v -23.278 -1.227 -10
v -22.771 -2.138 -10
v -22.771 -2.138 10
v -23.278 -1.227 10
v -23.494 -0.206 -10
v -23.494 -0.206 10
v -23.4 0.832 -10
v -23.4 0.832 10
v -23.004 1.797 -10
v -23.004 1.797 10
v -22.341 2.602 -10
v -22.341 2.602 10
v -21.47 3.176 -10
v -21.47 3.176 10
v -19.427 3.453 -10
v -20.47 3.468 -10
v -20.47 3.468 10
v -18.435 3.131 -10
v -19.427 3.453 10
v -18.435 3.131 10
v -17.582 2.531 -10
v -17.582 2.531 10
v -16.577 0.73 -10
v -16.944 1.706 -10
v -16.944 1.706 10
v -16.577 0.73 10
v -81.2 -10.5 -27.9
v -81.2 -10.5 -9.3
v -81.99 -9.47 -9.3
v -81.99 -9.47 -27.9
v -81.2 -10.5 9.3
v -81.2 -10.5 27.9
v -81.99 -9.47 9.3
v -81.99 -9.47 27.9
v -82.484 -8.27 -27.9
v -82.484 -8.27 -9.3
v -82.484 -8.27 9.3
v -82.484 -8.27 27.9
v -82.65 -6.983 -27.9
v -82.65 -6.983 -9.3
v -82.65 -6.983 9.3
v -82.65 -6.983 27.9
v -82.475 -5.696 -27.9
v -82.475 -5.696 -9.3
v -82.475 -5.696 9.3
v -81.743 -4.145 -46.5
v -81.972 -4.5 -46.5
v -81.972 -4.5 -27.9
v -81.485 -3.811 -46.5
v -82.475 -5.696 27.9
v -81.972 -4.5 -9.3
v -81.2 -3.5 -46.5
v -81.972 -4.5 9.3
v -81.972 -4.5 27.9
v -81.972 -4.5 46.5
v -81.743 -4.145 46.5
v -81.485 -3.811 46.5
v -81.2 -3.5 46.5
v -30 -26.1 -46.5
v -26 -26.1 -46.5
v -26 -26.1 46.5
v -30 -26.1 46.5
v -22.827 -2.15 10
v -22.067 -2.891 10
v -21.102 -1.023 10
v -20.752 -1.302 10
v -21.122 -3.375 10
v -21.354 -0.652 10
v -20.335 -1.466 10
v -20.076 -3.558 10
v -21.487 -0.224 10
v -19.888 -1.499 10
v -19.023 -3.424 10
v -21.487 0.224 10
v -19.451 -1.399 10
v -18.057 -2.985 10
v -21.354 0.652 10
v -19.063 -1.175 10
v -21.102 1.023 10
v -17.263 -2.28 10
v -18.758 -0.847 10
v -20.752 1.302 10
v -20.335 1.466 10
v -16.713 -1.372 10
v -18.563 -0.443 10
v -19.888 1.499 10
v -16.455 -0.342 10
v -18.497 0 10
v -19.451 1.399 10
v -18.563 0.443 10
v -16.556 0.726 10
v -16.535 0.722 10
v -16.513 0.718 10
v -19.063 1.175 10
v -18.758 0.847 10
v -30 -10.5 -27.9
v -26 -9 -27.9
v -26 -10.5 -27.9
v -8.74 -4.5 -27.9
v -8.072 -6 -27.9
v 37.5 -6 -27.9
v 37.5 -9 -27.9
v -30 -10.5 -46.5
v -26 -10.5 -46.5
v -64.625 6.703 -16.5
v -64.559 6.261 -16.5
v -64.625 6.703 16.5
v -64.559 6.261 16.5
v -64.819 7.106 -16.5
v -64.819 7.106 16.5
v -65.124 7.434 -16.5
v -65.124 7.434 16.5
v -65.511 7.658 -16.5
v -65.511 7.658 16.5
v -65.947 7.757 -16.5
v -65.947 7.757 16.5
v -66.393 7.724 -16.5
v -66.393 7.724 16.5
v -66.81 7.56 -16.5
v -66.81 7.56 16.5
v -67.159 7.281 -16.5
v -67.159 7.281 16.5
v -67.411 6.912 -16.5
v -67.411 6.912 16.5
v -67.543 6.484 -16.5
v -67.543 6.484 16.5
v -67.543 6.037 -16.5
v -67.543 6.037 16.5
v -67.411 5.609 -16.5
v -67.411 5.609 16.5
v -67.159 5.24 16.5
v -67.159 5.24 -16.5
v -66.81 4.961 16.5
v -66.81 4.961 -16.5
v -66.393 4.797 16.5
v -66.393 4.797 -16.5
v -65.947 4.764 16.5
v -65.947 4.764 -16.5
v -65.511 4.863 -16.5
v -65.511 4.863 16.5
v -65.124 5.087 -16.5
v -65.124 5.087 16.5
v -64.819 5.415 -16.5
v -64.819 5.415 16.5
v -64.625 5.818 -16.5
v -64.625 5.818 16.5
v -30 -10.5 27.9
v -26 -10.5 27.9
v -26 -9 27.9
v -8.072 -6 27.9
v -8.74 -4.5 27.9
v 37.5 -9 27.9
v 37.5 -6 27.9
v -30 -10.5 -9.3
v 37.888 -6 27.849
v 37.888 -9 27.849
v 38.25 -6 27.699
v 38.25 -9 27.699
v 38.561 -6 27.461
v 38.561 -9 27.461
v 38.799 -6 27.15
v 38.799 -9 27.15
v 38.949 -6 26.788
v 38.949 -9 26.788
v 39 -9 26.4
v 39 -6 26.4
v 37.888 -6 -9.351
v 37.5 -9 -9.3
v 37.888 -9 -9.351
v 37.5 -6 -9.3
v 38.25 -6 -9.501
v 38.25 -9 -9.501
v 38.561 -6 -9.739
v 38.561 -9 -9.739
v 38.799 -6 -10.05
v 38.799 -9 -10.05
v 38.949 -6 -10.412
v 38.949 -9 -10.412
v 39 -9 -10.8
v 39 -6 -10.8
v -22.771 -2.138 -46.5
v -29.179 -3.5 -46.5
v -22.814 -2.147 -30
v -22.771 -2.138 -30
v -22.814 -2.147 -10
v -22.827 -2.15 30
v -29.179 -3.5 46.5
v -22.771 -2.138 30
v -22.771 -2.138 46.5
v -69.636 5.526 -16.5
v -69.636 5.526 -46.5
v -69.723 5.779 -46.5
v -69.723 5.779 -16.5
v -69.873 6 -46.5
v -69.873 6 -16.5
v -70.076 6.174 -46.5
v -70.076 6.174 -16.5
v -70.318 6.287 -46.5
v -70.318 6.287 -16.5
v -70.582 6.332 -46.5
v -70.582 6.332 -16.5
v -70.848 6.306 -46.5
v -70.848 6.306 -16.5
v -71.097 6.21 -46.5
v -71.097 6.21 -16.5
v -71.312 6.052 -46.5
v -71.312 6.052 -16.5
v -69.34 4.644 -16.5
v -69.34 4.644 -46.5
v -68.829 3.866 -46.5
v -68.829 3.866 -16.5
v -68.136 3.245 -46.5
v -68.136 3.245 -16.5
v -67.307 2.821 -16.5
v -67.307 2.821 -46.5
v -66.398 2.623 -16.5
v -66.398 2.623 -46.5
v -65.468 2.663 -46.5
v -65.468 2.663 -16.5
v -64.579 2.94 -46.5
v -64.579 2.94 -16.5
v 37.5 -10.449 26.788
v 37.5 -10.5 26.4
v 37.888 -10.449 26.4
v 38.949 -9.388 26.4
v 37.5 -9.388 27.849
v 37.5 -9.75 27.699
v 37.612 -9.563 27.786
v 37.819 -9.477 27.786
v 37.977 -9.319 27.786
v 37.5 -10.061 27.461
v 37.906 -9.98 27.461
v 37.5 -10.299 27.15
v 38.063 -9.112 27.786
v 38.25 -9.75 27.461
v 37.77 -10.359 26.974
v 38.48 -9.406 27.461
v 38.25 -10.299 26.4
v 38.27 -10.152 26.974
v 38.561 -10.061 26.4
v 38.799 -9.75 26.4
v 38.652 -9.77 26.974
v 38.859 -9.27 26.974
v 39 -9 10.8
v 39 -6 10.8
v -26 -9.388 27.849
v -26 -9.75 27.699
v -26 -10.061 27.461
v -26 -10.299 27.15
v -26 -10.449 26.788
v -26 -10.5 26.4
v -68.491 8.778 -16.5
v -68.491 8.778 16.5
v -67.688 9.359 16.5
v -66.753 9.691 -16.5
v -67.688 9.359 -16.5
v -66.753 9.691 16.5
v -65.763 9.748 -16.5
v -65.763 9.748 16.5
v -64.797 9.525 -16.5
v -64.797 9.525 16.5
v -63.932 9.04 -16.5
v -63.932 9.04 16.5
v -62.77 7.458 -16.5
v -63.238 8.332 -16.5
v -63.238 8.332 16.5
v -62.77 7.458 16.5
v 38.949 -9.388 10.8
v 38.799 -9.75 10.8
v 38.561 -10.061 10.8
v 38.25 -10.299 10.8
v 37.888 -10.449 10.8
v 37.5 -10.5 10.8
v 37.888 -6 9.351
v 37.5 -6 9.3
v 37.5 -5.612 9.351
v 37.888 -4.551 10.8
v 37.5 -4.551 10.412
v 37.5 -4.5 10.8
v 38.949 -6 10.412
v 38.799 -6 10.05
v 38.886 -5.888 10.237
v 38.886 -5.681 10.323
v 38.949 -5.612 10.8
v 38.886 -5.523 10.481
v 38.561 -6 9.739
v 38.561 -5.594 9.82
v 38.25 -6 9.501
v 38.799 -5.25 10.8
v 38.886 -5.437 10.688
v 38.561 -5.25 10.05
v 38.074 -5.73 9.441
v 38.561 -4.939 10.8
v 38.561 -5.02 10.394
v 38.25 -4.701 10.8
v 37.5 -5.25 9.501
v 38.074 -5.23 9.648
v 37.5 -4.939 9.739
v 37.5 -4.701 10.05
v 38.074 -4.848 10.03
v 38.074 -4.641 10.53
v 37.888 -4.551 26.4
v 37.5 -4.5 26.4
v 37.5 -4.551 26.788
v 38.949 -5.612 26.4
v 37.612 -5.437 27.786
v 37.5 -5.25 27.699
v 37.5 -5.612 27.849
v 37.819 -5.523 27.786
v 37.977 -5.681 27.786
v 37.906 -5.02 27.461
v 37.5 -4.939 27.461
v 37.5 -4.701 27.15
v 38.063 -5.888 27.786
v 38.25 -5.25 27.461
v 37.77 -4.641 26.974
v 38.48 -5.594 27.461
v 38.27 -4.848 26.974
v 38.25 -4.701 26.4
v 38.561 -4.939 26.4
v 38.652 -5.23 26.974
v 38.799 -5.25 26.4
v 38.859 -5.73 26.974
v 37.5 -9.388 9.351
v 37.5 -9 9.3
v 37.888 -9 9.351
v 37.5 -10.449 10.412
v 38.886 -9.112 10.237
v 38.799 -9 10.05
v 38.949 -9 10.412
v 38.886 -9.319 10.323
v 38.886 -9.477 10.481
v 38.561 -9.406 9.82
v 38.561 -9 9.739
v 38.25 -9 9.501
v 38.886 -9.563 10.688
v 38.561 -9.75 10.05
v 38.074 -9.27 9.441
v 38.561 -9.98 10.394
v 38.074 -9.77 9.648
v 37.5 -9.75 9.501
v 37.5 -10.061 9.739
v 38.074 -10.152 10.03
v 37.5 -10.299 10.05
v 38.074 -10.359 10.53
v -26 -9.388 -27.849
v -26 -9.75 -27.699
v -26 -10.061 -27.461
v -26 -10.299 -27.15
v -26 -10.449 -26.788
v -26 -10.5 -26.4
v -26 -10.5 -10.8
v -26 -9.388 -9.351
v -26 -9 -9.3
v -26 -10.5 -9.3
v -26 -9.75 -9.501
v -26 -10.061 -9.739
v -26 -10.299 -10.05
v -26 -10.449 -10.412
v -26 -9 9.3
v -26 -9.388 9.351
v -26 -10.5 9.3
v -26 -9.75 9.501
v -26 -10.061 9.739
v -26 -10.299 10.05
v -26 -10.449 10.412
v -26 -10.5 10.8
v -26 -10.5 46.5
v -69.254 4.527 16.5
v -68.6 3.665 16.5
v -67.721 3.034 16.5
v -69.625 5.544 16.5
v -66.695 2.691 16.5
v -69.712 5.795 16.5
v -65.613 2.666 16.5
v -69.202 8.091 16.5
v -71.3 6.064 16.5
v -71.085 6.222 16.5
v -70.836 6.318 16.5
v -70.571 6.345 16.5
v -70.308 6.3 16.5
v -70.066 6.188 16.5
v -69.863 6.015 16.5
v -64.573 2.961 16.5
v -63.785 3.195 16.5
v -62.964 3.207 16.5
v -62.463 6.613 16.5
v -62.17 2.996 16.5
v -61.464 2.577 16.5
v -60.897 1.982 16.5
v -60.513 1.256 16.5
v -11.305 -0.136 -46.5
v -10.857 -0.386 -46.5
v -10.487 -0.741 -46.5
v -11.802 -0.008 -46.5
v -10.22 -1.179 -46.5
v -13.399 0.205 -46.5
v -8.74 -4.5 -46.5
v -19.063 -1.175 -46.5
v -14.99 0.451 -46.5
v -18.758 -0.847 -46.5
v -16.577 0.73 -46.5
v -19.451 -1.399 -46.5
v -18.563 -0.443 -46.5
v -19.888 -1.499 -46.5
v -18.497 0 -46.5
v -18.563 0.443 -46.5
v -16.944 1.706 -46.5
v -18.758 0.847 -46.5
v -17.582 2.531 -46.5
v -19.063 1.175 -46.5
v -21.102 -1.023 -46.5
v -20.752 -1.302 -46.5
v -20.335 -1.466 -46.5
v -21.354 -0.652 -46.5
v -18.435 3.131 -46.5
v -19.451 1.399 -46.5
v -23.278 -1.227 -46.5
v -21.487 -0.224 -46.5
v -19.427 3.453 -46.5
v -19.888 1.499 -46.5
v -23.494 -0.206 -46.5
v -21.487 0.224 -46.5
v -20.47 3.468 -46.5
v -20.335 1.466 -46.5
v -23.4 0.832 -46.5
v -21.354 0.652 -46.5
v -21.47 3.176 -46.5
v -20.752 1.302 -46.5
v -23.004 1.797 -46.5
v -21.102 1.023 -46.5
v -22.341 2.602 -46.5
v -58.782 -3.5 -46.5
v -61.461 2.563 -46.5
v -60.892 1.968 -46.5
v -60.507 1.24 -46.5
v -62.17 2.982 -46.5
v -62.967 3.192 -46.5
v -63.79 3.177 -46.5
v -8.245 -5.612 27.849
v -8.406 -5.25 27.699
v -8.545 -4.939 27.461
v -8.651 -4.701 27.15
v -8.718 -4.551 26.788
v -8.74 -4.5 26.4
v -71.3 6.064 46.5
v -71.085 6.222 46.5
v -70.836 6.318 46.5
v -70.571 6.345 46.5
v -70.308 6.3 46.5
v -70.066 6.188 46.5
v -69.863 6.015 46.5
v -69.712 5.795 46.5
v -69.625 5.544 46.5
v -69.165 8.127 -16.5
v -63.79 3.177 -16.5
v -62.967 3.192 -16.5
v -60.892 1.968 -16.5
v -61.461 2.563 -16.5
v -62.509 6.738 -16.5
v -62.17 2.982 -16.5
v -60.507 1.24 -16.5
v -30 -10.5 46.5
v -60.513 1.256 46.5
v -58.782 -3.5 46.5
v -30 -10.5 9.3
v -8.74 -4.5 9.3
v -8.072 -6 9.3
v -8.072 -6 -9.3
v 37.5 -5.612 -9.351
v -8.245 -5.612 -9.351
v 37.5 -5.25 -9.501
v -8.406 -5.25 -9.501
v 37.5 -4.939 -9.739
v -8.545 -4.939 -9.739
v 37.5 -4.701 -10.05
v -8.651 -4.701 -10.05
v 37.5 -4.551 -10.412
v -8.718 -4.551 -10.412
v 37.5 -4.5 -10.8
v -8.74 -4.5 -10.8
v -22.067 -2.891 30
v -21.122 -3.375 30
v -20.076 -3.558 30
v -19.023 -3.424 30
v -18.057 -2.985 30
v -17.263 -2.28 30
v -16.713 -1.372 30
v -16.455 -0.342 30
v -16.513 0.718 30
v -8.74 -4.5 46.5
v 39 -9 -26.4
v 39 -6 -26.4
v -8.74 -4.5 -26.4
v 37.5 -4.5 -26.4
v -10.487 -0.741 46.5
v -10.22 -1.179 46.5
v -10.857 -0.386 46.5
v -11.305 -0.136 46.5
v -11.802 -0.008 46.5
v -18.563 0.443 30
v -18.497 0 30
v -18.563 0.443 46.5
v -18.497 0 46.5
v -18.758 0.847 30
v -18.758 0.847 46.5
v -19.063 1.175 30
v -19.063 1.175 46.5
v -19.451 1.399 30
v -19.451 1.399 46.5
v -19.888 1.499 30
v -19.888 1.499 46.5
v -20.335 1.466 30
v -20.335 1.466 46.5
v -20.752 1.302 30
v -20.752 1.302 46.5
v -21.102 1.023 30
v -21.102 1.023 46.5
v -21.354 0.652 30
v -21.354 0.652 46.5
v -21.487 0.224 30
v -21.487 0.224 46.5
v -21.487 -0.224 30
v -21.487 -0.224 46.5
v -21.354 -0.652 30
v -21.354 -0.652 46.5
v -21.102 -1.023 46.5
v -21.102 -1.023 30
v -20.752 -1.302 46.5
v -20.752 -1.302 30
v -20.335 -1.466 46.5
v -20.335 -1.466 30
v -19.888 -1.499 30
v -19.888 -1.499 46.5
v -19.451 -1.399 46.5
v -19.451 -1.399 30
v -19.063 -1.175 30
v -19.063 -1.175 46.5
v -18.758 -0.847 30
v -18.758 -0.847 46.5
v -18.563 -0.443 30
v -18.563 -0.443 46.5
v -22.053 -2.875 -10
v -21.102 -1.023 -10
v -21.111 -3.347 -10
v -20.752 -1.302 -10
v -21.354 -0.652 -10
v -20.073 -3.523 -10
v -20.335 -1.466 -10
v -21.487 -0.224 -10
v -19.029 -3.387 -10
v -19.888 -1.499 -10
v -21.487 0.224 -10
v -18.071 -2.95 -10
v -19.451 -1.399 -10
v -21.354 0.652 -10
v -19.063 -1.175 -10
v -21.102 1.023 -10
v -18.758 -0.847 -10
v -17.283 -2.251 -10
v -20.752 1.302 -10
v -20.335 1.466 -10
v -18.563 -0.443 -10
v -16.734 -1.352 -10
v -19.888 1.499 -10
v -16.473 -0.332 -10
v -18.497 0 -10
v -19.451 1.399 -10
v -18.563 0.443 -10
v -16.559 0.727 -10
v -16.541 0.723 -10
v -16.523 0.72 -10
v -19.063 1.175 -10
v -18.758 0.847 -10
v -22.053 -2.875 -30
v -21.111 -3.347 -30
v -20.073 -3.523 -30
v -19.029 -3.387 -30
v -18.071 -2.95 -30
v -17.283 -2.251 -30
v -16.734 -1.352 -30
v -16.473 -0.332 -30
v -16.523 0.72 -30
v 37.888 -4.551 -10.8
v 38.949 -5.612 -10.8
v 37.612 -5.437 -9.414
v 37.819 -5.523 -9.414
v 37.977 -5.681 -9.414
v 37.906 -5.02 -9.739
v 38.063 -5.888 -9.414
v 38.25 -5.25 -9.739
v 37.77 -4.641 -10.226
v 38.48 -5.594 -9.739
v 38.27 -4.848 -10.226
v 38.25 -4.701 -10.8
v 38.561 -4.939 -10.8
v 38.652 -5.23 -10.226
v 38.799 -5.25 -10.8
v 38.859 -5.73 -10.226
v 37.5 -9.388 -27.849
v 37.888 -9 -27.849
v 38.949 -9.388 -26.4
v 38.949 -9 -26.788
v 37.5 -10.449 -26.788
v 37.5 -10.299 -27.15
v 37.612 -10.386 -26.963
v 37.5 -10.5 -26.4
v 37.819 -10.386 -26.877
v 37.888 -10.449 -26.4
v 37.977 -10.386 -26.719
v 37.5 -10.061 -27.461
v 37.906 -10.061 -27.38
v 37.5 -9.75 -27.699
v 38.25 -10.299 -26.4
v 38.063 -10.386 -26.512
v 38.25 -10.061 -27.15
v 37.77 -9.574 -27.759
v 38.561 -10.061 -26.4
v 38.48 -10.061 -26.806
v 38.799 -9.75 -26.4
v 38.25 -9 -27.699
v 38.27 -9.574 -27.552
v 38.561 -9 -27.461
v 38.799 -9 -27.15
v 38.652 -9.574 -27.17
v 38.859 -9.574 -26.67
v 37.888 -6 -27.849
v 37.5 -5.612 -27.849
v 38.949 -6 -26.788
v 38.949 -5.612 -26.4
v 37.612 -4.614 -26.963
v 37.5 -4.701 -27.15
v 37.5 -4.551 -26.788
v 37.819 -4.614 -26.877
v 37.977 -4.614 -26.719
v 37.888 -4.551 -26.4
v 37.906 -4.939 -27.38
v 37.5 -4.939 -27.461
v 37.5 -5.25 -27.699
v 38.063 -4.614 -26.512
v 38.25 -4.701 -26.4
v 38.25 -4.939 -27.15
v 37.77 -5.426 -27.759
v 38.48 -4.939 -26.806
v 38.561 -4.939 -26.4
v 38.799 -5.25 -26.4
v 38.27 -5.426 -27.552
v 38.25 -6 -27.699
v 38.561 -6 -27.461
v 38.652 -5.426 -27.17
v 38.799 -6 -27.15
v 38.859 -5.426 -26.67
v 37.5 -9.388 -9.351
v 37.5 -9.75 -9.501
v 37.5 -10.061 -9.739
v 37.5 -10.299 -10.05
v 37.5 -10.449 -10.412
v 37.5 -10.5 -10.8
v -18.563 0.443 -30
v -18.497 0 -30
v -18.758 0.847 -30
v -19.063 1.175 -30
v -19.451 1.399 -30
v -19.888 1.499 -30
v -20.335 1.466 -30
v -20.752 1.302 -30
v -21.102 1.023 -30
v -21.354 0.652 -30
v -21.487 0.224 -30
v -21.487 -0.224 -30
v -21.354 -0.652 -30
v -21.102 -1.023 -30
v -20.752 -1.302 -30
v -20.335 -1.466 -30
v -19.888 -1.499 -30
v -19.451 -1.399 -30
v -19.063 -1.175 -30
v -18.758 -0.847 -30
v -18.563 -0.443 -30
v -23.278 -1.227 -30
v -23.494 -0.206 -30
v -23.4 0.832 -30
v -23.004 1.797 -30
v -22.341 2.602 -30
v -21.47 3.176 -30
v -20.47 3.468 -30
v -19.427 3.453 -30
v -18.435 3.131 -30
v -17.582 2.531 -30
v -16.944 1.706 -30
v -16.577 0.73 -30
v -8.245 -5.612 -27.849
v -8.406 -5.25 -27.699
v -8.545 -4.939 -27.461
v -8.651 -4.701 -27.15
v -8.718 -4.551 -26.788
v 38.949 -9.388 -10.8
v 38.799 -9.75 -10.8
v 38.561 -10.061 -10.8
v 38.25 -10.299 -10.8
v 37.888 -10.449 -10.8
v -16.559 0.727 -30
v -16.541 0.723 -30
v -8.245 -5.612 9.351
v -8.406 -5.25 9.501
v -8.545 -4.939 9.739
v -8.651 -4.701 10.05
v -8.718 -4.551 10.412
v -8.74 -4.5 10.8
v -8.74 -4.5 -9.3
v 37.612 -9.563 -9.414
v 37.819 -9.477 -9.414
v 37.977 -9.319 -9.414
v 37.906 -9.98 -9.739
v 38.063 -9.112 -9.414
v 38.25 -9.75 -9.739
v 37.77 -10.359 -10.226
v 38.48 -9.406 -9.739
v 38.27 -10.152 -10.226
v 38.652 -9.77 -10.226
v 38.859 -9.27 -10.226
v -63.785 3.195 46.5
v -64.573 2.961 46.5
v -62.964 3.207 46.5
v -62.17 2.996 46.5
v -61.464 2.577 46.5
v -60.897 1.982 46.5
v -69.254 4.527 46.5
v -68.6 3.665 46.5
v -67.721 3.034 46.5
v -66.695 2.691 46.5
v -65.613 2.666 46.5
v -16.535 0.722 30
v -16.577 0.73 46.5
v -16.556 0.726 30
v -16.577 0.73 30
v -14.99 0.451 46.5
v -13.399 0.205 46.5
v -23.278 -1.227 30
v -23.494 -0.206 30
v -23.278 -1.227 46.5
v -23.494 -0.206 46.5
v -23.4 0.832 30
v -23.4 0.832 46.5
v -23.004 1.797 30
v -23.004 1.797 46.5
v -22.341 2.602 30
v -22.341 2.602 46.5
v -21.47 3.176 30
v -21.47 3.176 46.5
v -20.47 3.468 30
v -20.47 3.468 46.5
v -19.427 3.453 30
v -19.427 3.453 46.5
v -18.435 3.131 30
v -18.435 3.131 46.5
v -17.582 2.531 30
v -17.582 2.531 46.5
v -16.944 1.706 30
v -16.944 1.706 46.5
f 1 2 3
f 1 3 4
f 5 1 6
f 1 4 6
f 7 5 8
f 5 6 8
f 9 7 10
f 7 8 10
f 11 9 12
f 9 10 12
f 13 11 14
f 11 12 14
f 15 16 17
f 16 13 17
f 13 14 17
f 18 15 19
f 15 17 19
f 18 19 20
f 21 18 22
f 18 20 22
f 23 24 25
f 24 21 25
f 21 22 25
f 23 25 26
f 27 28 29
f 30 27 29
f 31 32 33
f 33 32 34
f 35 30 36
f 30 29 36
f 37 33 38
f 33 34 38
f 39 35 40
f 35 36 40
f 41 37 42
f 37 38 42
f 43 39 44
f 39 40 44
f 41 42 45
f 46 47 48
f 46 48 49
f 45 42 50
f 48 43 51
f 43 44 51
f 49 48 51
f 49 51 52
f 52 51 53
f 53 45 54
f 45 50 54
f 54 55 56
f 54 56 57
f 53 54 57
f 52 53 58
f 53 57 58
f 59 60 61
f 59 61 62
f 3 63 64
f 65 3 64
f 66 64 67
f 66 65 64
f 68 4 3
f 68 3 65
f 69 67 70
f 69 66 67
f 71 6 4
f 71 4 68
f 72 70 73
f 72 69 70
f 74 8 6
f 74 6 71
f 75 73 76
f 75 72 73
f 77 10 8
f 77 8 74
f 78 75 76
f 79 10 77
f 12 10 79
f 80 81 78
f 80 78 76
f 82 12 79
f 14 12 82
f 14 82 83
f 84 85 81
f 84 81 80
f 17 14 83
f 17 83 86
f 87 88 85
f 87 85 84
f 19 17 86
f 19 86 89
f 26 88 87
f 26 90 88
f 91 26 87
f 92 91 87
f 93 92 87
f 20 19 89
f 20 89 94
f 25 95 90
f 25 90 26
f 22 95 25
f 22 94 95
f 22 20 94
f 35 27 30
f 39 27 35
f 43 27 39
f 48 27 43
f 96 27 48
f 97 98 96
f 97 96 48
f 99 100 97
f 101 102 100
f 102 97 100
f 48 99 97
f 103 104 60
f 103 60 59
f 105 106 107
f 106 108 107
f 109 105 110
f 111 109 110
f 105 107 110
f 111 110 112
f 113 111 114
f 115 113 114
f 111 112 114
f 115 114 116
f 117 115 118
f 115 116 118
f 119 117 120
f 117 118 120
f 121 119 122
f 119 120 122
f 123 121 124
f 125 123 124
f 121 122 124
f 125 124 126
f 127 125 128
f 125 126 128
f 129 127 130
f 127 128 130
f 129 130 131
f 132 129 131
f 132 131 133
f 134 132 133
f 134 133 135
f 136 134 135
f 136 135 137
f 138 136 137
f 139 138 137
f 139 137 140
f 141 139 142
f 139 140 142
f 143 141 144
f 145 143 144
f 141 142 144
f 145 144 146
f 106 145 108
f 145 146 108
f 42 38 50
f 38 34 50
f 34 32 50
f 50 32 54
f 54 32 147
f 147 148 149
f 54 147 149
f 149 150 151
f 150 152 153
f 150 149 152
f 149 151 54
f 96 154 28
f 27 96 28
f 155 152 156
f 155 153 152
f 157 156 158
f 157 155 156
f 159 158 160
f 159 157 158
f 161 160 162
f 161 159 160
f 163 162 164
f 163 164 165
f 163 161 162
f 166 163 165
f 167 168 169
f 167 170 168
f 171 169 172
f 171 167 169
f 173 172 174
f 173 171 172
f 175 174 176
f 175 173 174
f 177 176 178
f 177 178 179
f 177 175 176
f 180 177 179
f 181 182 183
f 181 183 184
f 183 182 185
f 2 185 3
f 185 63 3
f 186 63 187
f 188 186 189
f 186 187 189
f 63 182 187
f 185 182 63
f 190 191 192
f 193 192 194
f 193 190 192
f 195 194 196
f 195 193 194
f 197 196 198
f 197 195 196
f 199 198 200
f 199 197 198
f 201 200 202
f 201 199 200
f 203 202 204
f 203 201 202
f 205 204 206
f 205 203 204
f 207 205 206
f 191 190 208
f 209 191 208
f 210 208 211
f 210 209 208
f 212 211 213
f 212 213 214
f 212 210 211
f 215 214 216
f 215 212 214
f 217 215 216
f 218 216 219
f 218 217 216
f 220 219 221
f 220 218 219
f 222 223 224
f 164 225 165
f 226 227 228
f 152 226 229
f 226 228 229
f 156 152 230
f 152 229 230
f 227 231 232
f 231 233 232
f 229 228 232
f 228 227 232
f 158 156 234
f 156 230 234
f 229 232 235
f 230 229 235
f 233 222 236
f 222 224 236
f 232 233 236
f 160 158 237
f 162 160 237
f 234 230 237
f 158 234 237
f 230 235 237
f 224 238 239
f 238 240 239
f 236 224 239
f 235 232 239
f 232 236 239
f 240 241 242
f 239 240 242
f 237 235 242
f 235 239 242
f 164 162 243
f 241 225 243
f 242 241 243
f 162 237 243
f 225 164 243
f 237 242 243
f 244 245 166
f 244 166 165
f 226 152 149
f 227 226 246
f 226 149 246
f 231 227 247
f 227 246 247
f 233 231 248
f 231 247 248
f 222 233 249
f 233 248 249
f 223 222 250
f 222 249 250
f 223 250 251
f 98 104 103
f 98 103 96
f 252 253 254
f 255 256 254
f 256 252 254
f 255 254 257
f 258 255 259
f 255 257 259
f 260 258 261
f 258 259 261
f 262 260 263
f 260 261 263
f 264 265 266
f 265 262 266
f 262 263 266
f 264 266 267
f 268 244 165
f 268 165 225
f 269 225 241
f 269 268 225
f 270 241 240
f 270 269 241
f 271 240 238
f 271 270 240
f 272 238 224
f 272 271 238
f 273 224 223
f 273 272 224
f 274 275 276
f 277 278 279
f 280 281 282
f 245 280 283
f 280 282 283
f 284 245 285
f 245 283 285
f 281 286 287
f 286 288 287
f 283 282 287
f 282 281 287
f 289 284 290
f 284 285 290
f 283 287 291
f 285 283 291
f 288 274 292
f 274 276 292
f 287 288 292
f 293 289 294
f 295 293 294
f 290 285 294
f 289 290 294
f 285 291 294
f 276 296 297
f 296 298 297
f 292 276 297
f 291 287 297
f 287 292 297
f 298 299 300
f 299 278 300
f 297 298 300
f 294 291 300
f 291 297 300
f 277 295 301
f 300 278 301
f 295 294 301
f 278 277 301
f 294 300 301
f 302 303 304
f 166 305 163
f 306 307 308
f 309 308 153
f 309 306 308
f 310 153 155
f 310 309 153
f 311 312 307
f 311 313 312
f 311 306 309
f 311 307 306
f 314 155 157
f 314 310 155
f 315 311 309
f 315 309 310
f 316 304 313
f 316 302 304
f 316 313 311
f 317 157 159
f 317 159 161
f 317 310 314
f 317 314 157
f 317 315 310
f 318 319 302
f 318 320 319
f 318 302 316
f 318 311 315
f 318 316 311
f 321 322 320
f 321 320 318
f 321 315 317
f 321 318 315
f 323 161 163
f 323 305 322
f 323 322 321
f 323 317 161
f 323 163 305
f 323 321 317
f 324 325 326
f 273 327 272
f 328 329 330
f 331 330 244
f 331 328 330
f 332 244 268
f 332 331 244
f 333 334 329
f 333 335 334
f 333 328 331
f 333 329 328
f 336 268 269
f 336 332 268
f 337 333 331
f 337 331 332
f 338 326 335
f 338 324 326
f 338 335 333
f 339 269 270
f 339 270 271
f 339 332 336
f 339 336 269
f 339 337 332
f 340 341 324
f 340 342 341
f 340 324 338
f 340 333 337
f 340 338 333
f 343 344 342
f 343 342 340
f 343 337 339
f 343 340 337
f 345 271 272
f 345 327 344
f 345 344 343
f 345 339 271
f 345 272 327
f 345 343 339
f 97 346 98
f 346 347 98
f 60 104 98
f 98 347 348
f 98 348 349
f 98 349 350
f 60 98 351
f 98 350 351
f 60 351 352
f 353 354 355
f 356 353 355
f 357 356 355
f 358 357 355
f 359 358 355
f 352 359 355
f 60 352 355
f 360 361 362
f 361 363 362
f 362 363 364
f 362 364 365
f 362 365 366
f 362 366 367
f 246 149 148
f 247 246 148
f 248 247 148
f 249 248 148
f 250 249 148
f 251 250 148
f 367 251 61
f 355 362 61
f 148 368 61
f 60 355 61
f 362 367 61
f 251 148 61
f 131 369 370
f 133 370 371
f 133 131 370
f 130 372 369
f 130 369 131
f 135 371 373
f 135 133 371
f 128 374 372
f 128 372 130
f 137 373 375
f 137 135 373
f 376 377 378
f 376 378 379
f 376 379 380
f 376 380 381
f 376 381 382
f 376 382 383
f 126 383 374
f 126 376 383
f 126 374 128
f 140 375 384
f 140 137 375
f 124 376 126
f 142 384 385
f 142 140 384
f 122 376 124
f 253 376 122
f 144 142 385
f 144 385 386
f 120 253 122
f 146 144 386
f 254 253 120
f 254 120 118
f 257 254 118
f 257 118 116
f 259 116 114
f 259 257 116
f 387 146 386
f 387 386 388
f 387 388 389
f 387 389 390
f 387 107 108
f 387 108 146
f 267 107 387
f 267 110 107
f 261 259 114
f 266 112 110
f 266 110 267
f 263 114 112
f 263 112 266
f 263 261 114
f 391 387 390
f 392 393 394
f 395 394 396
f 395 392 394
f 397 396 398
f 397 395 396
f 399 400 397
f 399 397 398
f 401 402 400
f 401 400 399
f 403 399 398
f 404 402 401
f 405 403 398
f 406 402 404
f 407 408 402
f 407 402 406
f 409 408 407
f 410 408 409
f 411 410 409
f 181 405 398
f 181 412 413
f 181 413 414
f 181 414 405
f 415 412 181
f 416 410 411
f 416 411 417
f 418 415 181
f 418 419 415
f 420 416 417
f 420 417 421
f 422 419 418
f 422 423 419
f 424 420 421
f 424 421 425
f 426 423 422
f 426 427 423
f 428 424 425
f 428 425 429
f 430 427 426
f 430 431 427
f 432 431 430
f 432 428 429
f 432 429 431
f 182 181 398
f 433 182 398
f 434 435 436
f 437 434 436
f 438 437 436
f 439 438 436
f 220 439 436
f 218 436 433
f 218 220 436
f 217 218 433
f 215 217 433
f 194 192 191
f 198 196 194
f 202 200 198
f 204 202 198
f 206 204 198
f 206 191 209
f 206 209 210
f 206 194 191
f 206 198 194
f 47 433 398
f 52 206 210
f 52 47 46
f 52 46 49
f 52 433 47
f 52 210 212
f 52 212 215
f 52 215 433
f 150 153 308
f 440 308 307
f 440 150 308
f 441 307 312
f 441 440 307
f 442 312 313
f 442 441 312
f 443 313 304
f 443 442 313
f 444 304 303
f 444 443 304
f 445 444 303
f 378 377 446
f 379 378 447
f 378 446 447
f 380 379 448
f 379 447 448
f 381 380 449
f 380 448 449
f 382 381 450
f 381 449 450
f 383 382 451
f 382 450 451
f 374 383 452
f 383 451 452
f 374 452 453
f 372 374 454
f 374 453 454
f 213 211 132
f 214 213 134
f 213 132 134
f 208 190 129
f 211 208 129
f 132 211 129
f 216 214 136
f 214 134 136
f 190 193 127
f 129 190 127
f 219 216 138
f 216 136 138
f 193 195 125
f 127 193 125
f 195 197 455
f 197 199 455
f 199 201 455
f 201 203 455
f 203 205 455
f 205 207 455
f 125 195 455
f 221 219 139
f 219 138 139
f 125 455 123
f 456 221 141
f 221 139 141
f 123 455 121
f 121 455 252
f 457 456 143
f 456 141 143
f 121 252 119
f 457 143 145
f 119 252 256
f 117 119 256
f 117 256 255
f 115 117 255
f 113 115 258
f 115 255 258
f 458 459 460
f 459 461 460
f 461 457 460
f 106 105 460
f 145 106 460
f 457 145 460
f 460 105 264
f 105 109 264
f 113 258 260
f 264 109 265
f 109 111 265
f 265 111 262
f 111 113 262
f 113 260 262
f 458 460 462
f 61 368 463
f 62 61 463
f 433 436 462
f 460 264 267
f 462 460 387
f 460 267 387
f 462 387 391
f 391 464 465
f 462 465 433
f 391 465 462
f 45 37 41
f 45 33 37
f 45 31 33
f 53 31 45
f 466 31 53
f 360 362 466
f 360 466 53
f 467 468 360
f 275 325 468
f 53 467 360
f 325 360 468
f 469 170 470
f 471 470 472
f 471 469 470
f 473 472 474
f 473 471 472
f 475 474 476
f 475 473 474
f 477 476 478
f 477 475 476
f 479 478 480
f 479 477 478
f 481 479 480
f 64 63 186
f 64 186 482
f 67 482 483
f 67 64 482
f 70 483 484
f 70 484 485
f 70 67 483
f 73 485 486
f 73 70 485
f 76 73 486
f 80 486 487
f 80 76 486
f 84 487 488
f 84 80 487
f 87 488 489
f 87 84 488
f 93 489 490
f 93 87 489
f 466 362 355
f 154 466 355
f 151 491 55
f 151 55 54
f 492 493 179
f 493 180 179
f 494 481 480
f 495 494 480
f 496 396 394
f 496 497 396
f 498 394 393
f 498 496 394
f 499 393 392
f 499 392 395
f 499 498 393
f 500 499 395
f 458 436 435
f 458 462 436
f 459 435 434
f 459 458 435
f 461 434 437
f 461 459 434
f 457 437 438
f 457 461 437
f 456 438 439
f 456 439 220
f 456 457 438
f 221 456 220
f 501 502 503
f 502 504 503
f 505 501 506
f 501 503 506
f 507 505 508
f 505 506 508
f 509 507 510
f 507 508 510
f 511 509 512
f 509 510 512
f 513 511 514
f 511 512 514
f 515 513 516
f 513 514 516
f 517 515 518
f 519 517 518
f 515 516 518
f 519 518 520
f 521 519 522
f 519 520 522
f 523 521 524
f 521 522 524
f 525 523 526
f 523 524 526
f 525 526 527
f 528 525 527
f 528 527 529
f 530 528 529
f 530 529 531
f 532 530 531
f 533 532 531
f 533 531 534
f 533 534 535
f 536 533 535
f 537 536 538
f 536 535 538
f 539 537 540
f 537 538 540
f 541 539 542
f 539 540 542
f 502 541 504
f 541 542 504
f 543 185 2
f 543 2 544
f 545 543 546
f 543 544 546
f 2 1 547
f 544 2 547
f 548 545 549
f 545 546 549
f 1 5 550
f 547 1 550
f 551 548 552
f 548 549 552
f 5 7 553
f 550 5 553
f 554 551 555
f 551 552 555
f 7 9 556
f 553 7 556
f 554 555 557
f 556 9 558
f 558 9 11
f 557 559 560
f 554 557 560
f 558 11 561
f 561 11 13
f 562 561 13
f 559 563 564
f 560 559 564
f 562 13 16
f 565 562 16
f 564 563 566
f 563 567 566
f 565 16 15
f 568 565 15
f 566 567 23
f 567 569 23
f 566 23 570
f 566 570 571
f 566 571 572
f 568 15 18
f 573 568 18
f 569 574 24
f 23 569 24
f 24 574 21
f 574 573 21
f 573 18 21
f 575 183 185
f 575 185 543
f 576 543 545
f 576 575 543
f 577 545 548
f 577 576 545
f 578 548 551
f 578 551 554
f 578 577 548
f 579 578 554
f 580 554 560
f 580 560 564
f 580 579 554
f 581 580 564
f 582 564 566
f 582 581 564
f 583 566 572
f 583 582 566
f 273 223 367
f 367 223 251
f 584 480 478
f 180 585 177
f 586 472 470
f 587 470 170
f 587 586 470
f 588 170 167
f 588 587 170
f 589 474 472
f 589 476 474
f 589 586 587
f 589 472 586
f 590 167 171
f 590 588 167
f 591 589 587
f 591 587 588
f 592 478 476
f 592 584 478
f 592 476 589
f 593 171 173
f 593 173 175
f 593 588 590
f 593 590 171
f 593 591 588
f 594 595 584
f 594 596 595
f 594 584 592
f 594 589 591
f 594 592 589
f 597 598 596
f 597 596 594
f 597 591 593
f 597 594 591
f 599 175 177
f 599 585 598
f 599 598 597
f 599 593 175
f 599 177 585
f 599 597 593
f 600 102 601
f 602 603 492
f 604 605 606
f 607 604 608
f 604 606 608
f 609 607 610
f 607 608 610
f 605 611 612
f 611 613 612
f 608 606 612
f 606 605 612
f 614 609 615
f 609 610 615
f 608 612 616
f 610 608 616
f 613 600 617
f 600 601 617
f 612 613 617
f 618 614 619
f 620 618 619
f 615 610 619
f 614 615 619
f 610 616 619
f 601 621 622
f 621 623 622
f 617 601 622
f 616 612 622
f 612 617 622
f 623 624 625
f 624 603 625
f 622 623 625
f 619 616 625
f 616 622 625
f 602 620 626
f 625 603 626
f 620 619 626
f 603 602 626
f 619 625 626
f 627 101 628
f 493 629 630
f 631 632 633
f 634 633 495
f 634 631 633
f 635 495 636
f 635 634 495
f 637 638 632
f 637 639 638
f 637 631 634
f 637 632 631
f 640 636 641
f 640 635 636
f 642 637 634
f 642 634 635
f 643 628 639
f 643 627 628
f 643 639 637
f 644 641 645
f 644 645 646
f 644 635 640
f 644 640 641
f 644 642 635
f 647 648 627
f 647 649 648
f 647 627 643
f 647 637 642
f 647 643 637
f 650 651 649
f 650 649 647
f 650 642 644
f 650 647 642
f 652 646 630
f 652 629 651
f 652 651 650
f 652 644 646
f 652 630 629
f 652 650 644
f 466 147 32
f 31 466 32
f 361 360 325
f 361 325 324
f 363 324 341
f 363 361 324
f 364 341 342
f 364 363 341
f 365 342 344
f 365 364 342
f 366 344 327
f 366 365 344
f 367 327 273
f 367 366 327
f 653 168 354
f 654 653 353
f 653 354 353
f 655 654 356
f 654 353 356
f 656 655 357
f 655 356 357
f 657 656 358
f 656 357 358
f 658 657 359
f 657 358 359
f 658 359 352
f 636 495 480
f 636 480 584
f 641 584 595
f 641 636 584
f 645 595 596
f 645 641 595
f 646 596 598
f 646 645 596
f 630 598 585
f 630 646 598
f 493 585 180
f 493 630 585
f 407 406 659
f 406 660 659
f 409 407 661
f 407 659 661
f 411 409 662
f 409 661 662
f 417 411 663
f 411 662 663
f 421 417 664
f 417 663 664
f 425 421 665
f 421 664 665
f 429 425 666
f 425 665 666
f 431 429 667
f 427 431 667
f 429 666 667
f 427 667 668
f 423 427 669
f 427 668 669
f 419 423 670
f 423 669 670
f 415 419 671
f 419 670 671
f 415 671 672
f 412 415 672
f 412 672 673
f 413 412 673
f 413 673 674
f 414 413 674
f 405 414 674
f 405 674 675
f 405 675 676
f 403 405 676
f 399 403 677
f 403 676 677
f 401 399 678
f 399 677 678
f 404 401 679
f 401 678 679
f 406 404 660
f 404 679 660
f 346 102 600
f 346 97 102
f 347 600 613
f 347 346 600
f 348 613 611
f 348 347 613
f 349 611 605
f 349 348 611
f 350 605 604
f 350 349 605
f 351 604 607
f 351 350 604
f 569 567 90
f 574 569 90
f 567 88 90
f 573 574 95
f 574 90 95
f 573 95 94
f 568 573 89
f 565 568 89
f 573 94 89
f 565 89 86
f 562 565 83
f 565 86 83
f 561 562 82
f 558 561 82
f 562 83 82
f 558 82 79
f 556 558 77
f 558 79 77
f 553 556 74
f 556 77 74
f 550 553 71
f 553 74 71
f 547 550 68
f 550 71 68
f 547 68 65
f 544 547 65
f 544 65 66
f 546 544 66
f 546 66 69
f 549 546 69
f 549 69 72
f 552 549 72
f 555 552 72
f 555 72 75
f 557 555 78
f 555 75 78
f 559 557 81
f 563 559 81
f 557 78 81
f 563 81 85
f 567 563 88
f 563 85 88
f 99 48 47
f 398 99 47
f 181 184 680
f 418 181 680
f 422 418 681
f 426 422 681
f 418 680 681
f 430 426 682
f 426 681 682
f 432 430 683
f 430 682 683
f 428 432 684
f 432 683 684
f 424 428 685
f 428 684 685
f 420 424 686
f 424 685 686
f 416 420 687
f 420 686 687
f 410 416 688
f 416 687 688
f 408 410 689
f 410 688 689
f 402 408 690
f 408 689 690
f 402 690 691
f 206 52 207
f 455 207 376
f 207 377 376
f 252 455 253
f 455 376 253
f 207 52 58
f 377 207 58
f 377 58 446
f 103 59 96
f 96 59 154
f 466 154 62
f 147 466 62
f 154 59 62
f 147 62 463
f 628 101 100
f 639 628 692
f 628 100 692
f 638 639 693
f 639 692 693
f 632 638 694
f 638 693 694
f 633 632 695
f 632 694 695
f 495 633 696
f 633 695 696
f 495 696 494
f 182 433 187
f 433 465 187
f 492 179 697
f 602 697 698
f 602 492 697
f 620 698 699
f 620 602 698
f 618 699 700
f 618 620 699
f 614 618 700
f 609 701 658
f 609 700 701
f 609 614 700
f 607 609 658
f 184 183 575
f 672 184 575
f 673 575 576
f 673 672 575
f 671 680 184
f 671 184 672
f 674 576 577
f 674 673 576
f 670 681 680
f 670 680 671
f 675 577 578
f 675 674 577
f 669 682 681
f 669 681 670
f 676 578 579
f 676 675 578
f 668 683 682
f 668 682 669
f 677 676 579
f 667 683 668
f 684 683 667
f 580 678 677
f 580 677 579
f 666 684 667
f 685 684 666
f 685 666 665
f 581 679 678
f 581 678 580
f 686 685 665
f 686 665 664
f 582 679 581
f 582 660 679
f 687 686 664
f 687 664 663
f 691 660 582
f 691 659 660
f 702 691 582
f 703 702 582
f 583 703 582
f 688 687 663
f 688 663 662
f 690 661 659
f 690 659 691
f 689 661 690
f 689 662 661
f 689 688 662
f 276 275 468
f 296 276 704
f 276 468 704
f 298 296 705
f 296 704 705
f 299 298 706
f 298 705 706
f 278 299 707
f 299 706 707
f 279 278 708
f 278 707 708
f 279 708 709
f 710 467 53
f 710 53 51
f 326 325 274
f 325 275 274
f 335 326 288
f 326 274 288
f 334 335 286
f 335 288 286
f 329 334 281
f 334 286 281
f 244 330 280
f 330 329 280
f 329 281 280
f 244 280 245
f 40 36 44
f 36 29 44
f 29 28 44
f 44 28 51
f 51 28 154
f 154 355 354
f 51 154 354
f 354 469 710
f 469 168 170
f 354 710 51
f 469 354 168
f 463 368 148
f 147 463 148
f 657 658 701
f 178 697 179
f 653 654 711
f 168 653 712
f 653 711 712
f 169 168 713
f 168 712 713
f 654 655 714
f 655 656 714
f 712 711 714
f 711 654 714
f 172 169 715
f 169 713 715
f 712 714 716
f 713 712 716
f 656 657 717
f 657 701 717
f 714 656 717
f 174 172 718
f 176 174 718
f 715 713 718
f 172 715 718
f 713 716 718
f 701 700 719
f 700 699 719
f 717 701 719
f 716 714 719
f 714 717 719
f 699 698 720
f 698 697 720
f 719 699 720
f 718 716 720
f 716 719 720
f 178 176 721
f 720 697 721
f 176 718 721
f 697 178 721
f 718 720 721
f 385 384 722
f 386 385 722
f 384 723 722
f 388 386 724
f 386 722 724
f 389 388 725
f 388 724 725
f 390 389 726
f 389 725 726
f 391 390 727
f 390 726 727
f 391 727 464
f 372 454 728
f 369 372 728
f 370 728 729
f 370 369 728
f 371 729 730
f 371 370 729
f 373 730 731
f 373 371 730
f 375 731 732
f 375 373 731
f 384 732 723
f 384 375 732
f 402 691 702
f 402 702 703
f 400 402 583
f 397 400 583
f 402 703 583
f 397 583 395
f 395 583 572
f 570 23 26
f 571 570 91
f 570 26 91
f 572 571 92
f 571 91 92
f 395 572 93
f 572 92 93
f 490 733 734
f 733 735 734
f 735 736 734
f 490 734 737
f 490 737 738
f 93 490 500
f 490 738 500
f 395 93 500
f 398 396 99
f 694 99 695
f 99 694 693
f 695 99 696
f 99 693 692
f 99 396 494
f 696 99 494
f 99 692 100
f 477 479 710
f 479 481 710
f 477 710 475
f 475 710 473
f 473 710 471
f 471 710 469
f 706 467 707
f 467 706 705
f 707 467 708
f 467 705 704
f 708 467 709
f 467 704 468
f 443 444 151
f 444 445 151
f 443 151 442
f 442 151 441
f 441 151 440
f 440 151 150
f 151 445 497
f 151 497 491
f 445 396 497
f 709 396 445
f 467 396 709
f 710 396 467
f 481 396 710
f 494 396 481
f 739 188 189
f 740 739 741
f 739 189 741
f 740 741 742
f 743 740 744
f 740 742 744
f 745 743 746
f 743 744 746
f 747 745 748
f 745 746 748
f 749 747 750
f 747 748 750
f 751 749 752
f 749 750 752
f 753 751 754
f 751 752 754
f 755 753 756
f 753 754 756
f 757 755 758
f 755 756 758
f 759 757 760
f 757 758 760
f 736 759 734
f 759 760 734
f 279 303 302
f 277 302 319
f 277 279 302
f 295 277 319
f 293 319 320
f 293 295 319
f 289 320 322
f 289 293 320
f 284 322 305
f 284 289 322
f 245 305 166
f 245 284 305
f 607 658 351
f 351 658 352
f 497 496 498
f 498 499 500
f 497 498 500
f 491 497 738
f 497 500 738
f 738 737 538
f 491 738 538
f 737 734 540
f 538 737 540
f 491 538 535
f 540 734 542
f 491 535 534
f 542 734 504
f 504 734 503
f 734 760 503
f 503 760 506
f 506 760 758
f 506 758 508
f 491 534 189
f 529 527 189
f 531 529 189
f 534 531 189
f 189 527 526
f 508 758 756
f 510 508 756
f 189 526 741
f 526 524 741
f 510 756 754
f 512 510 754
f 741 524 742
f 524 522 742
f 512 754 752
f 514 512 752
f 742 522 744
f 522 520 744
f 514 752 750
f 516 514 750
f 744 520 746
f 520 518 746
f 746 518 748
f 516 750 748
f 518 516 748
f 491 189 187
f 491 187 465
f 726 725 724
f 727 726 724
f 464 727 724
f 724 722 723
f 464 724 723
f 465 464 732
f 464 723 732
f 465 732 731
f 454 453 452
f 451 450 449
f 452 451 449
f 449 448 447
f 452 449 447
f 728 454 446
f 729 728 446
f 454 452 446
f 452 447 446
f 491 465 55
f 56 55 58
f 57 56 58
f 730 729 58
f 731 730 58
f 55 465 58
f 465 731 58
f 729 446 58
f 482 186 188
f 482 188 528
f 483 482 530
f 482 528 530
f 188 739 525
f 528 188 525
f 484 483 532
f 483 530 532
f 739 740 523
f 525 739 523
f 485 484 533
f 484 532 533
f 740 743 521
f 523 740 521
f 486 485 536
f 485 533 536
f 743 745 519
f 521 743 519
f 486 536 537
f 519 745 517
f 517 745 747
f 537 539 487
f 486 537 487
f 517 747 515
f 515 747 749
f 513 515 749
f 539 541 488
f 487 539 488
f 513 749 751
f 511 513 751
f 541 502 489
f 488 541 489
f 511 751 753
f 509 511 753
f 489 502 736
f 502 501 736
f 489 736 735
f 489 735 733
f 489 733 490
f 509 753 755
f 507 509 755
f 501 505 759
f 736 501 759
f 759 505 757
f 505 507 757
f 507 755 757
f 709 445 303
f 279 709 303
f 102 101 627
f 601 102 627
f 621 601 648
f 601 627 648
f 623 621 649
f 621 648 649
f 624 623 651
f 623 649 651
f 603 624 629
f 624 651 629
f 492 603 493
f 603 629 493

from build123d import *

# Parameters (mm, degrees)
SALIENTE_EXTRUIR2_DEPTH   = 46.49999999999997
CROQUIS3_R                = 1.5007742960379549
CROQUIS3_R_2              = 1.503322104684281
CORTAR_EXTRUIR1_DEPTH     = 46.49999999999997
CORTAR_EXTRUIR2_START     = 16.5
CORTAR_EXTRUIR2_OUTLINE_R = 1.500774296
CORTAR_EXTRUIR2_DEPTH     = 30
REDONDEO2_R               = 3
CORTAR_EXTRUIR3_START     = -46.5
CORTAR_EXTRUIR3_OUTLINE_R = 1.500774296
CORTAR_EXTRUIR3_DEPTH     = 30
REDONDEO3_R               = 3
CORTAR_EXTRUIR4_START     = 10
CORTAR_EXTRUIR4_OUTLINE_R = 1.503322105
CORTAR_EXTRUIR4_DEPTH     = 20
CORTAR_EXTRUIR5_START     = -30
CORTAR_EXTRUIR5_OUTLINE_R = 1.503322105
CORTAR_EXTRUIR5_DEPTH     = 20
REDONDEO4_R               = 1
CORTAR_EXTRUIR12_DEPTH    = 155.46083657878992
CROQUIS6_W                = 18.599999999999966
CROQUIS6_H                = 6.000000000000004
CORTAR_EXTRUIR13_DEPTH    = 133.823646460648
CROQUIS7_W                = 18.599999999999966
CROQUIS7_H                = 6.000000000000004
CORTAR_EXTRUIR14_DEPTH    = 133.823646460648
REDONDEO5_R               = 1.5
REDONDEO6_R               = 2


# Read off the part's stored shape, not the designer's step: Cortar-Extruir2, Cortar-Extruir3, Cortar-Extruir4, Cortar-Extruir5
with BuildPart() as part:
    # Croquis1 → Saliente-Extruir2 (new, symmetric)
    with BuildSketch(Plane.XY):
        with BuildLine():
            Line((-10.683677010448408, -0.13792021644576552), (-8.74048031278475, -4.500000000012256))
            Line((-8.74048031278475, -4.500000000012256), (39.00000000000001, -4.500000000012256))
            Line((39.00000000000001, -4.500000000012256), (39.00000000000001, -10.500000000012262))
            Line((39.00000000000001, -10.500000000012262), (-25.99999999999999, -10.500000000012262))
            Line((-25.99999999999999, -10.500000000012262), (-25.99999999999999, -26.10000000001226))
            Line((-25.99999999999999, -26.10000000001226), (-29.999999999999986, -26.100000000012262))
            Line((-29.999999999999986, -26.100000000012262), (-29.999999999999993, -10.500000000012264))
            Line((-29.999999999999993, -10.500000000012264), (-81.19999999999999, -10.500000000012271))
            ThreePointArc((-81.19999999999999, -10.500000000012271), (-82.6497474683058, -7.000000000012269), (-81.19999999999999, -3.5000000000122697))
            Line((-81.19999999999999, -3.5000000000122697), (-68.49110633124283, 8.777732226211745))
            ThreePointArc((-68.49110633124283, 8.777732226211745), (-65.27231144406849, 9.67090124633749), (-62.77037609438549, 7.457598074555828))
            Line((-62.77037609438549, 7.457598074555828), (-58.782136556190004, -3.5000000000122684))
            Line((-58.782136556190004, -3.5000000000122684), (-29.179236040573016, -3.500000000012267))
            Line((-29.179236040573016, -3.500000000012267), (-22.77115447929422, -2.1379202164457745))
            ThreePointArc((-22.77115447929422, -2.1379202164457745), (-21.470497358111732, 3.17610414183578), (-16.57695737694327, 0.729917256089285))
            ThreePointArc((-16.57695737694327, 0.729917256089285), (-13.63855195060632, 0.24007822050397465), (-10.683677010448408, -0.13792021644576552))
        make_face()
    extrude(amount=SALIENTE_EXTRUIR2_DEPTH, both=True)

    # Croquis3 → Cortar-Extruir1 (cut, symmetric)
    with BuildSketch(Plane.XY):
        with Locations((-66.05930026713617, 6.260527572915973)):
            Circle(CROQUIS3_R)
        with Locations((-19.999999999999996, 0)):
            Circle(CROQUIS3_R_2)
    extrude(amount=CORTAR_EXTRUIR1_DEPTH, both=True, mode=Mode.SUBTRACT)

    # Cortar-Extruir2 outline → Cortar-Extruir2 (cut)
    with BuildSketch(Plane.XY.offset(CORTAR_EXTRUIR2_START)):
        with BuildLine():
            Line((-68.491106331, 8.777732226), (-69.201699105, 8.091246996))
            ThreePointArc((-69.201699105, 8.091246996), (-66.848168988, 2.721235528), (-62.462991688, 6.61306636))
            Line((-62.462991688, 6.61306636), (-62.770376094, 7.457598075))
            ThreePointArc((-62.770376094, 7.457598075), (-65.272311444, 9.670901246), (-68.491106331, 8.777732226))
        make_face()
        with Locations((-66.059300267, 6.260527573)):
            Circle(CORTAR_EXTRUIR2_OUTLINE_R, mode=Mode.SUBTRACT)
    extrude(amount=CORTAR_EXTRUIR2_DEPTH, mode=Mode.SUBTRACT)

    # Redondeo2
    redondeo2_edges = [part.edges().sort_by_distance(p)[0] for p in [
        (-62.462991687999995, 6.613066360000001, 31.5),
    ]]
    fillet(redondeo2_edges, radius=REDONDEO2_R)

    # Cortar-Extruir3 outline → Cortar-Extruir3 (cut)
    with BuildSketch(Plane.XY.offset(CORTAR_EXTRUIR3_START)):
        with BuildLine():
            ThreePointArc((-69.164573514, 8.127113066), (-66.827048097, 2.685630168), (-62.508602445, 6.738380883))
            Line((-62.508602445, 6.738380883), (-62.770376094, 7.457598075))
            ThreePointArc((-62.770376094, 7.457598075), (-65.272311444, 9.670901246), (-68.491106331, 8.777732226))
            Line((-68.491106331, 8.777732226), (-69.164573514, 8.127113066))
        make_face()
        with Locations((-66.059300267, 6.260527573)):
            Circle(CORTAR_EXTRUIR3_OUTLINE_R, mode=Mode.SUBTRACT)
    extrude(amount=CORTAR_EXTRUIR3_DEPTH, mode=Mode.SUBTRACT)

    # Redondeo3
    redondeo3_edges = [part.edges().sort_by_distance(p)[0] for p in [
        (-62.508602444999994, 6.738380883, -31.5),
    ]]
    fillet(redondeo3_edges, radius=REDONDEO3_R)

    # Cortar-Extruir4 outline → Cortar-Extruir4 (cut)
    with BuildSketch(Plane.XY.offset(CORTAR_EXTRUIR4_START)):
        with BuildLine():
            Line((-22.771154479, -2.137920216), (-22.827271519, -2.149848262))
            ThreePointArc((-22.827271519, -2.149848262), (-18.523452571, -3.240720775), (-16.513304708, 0.718087877))
            ThreePointArc((-16.513304708, 0.718087877), (-16.545132262, 0.723996005), (-16.576957377, 0.729917256))
            ThreePointArc((-16.576957377, 0.729917256), (-21.470497358, 3.176104142), (-22.771154479, -2.137920216))
        make_face()
        with Locations((-20, 0)):
            Circle(CORTAR_EXTRUIR4_OUTLINE_R, mode=Mode.SUBTRACT)
    extrude(amount=CORTAR_EXTRUIR4_DEPTH, mode=Mode.SUBTRACT)

    # Cortar-Extruir5 outline → Cortar-Extruir5 (cut)
    with BuildSketch(Plane.XY.offset(CORTAR_EXTRUIR5_START)):
        with BuildLine():
            ThreePointArc((-22.813751372, -2.146974465), (-18.533466696, -3.203987987), (-16.523253553, 0.719933216))
            ThreePointArc((-16.523253553, 0.719933216), (-16.550106333, 0.724920565), (-16.576957377, 0.729917256))
            ThreePointArc((-16.576957377, 0.729917256), (-21.470497358, 3.176104142), (-22.771154479, -2.137920216))
            Line((-22.771154479, -2.137920216), (-22.813751372, -2.146974465))
        make_face()
        with Locations((-20, 0)):
            Circle(CORTAR_EXTRUIR5_OUTLINE_R, mode=Mode.SUBTRACT)
    extrude(amount=CORTAR_EXTRUIR5_DEPTH, mode=Mode.SUBTRACT)

    # Redondeo4
    redondeo4_edges = [part.edges().sort_by_distance(p)[0] for p in [
        (-69.20169910499999, 8.091246995999999, 31.5),
        (-69.164573514, 8.127113066, -31.5),
    ]]
    fillet(redondeo4_edges, radius=REDONDEO4_R)

    # Croquis3D6 → Cortar-Extruir12 (cut, through all)
    with BuildSketch(Plane(origin=(39.00000000000001, -10.500000000012262, -46.49999999999997), x_dir=(0, 0.30700277992275854, 0.9517086177605509), z_dir=(-1, 0, 0))):
        Polygon((0, 0), (17.701780290346246, -5.710251706563308), (19.543796969882806, 8.7e-16), (1.8420166795365527, 5.71025170656331), align=None)
    extrude(amount=CORTAR_EXTRUIR12_DEPTH, mode=Mode.SUBTRACT)

    # Croquis6 → Cortar-Extruir13 (cut, through all)
    with BuildSketch(Plane(origin=(39.00000000000001, 0, 0), x_dir=(0, 0, -1), z_dir=(1, 0, 0))):
        with Locations((-1.865e-14, -7.50000000001226)):
            Rectangle(CROQUIS6_W, CROQUIS6_H)
    extrude(amount=-CORTAR_EXTRUIR13_DEPTH, mode=Mode.SUBTRACT)

    # Croquis7 → Cortar-Extruir14 (cut, through all)
    with BuildSketch(Plane(origin=(39.00000000000001, 0, 0), x_dir=(0, 0, -1), z_dir=(1, 0, 0))):
        with Locations((-37.19999999999999, -7.50000000001226)):
            Rectangle(CROQUIS7_W, CROQUIS7_H)
    extrude(amount=-CORTAR_EXTRUIR14_DEPTH, mode=Mode.SUBTRACT)

    # Redondeo5
    redondeo5_edges = [part.edges().sort_by_distance(p)[0] for p in [
        (39.00000000000001, -7.500000000012258, -27.899999999999963),
        (15.12975984360763, -4.500000000012255, -27.899999999999963),
        (6.500000000000007, -10.50000000001226, -27.89999999999997),
        (39.00000000000001, -4.500000000012256, -18.599999999999966),
        (39.00000000000001, -10.500000000012262, -18.599999999999966),
        (6.500000000000007, -10.500000000012262, -9.299999999999965),
        (15.12975984360763, -4.500000000012258, -9.299999999999965),
        (6.500000000000007, -10.500000000012262, 9.300000000000002),
        (15.12975984360763, -4.500000000012258, 9.300000000000002),
        (39.00000000000001, -7.50000000001226, -9.299999999999965),
        (39.00000000000001, -7.50000000001226, 9.300000000000002),
        (39.00000000000001, -4.500000000012256, 18.600000000000005),
        (39.00000000000001, -10.500000000012262, 18.600000000000005),
        (15.12975984360763, -4.500000000012258, 27.900000000000006),
        (6.500000000000007, -10.500000000012262, 27.900000000000006),
        (39.00000000000001, -7.50000000001226, 27.900000000000006),
    ]]
    fillet(redondeo5_edges, radius=REDONDEO5_R)

    # Redondeo6
    redondeo6_edges = [part.edges().sort_by_distance(p)[0] for p in [
        (-10.683677010448406, -0.13792021644577176, 0),
    ]]
    fillet(redondeo6_edges, radius=REDONDEO6_R)


solid = part.part
